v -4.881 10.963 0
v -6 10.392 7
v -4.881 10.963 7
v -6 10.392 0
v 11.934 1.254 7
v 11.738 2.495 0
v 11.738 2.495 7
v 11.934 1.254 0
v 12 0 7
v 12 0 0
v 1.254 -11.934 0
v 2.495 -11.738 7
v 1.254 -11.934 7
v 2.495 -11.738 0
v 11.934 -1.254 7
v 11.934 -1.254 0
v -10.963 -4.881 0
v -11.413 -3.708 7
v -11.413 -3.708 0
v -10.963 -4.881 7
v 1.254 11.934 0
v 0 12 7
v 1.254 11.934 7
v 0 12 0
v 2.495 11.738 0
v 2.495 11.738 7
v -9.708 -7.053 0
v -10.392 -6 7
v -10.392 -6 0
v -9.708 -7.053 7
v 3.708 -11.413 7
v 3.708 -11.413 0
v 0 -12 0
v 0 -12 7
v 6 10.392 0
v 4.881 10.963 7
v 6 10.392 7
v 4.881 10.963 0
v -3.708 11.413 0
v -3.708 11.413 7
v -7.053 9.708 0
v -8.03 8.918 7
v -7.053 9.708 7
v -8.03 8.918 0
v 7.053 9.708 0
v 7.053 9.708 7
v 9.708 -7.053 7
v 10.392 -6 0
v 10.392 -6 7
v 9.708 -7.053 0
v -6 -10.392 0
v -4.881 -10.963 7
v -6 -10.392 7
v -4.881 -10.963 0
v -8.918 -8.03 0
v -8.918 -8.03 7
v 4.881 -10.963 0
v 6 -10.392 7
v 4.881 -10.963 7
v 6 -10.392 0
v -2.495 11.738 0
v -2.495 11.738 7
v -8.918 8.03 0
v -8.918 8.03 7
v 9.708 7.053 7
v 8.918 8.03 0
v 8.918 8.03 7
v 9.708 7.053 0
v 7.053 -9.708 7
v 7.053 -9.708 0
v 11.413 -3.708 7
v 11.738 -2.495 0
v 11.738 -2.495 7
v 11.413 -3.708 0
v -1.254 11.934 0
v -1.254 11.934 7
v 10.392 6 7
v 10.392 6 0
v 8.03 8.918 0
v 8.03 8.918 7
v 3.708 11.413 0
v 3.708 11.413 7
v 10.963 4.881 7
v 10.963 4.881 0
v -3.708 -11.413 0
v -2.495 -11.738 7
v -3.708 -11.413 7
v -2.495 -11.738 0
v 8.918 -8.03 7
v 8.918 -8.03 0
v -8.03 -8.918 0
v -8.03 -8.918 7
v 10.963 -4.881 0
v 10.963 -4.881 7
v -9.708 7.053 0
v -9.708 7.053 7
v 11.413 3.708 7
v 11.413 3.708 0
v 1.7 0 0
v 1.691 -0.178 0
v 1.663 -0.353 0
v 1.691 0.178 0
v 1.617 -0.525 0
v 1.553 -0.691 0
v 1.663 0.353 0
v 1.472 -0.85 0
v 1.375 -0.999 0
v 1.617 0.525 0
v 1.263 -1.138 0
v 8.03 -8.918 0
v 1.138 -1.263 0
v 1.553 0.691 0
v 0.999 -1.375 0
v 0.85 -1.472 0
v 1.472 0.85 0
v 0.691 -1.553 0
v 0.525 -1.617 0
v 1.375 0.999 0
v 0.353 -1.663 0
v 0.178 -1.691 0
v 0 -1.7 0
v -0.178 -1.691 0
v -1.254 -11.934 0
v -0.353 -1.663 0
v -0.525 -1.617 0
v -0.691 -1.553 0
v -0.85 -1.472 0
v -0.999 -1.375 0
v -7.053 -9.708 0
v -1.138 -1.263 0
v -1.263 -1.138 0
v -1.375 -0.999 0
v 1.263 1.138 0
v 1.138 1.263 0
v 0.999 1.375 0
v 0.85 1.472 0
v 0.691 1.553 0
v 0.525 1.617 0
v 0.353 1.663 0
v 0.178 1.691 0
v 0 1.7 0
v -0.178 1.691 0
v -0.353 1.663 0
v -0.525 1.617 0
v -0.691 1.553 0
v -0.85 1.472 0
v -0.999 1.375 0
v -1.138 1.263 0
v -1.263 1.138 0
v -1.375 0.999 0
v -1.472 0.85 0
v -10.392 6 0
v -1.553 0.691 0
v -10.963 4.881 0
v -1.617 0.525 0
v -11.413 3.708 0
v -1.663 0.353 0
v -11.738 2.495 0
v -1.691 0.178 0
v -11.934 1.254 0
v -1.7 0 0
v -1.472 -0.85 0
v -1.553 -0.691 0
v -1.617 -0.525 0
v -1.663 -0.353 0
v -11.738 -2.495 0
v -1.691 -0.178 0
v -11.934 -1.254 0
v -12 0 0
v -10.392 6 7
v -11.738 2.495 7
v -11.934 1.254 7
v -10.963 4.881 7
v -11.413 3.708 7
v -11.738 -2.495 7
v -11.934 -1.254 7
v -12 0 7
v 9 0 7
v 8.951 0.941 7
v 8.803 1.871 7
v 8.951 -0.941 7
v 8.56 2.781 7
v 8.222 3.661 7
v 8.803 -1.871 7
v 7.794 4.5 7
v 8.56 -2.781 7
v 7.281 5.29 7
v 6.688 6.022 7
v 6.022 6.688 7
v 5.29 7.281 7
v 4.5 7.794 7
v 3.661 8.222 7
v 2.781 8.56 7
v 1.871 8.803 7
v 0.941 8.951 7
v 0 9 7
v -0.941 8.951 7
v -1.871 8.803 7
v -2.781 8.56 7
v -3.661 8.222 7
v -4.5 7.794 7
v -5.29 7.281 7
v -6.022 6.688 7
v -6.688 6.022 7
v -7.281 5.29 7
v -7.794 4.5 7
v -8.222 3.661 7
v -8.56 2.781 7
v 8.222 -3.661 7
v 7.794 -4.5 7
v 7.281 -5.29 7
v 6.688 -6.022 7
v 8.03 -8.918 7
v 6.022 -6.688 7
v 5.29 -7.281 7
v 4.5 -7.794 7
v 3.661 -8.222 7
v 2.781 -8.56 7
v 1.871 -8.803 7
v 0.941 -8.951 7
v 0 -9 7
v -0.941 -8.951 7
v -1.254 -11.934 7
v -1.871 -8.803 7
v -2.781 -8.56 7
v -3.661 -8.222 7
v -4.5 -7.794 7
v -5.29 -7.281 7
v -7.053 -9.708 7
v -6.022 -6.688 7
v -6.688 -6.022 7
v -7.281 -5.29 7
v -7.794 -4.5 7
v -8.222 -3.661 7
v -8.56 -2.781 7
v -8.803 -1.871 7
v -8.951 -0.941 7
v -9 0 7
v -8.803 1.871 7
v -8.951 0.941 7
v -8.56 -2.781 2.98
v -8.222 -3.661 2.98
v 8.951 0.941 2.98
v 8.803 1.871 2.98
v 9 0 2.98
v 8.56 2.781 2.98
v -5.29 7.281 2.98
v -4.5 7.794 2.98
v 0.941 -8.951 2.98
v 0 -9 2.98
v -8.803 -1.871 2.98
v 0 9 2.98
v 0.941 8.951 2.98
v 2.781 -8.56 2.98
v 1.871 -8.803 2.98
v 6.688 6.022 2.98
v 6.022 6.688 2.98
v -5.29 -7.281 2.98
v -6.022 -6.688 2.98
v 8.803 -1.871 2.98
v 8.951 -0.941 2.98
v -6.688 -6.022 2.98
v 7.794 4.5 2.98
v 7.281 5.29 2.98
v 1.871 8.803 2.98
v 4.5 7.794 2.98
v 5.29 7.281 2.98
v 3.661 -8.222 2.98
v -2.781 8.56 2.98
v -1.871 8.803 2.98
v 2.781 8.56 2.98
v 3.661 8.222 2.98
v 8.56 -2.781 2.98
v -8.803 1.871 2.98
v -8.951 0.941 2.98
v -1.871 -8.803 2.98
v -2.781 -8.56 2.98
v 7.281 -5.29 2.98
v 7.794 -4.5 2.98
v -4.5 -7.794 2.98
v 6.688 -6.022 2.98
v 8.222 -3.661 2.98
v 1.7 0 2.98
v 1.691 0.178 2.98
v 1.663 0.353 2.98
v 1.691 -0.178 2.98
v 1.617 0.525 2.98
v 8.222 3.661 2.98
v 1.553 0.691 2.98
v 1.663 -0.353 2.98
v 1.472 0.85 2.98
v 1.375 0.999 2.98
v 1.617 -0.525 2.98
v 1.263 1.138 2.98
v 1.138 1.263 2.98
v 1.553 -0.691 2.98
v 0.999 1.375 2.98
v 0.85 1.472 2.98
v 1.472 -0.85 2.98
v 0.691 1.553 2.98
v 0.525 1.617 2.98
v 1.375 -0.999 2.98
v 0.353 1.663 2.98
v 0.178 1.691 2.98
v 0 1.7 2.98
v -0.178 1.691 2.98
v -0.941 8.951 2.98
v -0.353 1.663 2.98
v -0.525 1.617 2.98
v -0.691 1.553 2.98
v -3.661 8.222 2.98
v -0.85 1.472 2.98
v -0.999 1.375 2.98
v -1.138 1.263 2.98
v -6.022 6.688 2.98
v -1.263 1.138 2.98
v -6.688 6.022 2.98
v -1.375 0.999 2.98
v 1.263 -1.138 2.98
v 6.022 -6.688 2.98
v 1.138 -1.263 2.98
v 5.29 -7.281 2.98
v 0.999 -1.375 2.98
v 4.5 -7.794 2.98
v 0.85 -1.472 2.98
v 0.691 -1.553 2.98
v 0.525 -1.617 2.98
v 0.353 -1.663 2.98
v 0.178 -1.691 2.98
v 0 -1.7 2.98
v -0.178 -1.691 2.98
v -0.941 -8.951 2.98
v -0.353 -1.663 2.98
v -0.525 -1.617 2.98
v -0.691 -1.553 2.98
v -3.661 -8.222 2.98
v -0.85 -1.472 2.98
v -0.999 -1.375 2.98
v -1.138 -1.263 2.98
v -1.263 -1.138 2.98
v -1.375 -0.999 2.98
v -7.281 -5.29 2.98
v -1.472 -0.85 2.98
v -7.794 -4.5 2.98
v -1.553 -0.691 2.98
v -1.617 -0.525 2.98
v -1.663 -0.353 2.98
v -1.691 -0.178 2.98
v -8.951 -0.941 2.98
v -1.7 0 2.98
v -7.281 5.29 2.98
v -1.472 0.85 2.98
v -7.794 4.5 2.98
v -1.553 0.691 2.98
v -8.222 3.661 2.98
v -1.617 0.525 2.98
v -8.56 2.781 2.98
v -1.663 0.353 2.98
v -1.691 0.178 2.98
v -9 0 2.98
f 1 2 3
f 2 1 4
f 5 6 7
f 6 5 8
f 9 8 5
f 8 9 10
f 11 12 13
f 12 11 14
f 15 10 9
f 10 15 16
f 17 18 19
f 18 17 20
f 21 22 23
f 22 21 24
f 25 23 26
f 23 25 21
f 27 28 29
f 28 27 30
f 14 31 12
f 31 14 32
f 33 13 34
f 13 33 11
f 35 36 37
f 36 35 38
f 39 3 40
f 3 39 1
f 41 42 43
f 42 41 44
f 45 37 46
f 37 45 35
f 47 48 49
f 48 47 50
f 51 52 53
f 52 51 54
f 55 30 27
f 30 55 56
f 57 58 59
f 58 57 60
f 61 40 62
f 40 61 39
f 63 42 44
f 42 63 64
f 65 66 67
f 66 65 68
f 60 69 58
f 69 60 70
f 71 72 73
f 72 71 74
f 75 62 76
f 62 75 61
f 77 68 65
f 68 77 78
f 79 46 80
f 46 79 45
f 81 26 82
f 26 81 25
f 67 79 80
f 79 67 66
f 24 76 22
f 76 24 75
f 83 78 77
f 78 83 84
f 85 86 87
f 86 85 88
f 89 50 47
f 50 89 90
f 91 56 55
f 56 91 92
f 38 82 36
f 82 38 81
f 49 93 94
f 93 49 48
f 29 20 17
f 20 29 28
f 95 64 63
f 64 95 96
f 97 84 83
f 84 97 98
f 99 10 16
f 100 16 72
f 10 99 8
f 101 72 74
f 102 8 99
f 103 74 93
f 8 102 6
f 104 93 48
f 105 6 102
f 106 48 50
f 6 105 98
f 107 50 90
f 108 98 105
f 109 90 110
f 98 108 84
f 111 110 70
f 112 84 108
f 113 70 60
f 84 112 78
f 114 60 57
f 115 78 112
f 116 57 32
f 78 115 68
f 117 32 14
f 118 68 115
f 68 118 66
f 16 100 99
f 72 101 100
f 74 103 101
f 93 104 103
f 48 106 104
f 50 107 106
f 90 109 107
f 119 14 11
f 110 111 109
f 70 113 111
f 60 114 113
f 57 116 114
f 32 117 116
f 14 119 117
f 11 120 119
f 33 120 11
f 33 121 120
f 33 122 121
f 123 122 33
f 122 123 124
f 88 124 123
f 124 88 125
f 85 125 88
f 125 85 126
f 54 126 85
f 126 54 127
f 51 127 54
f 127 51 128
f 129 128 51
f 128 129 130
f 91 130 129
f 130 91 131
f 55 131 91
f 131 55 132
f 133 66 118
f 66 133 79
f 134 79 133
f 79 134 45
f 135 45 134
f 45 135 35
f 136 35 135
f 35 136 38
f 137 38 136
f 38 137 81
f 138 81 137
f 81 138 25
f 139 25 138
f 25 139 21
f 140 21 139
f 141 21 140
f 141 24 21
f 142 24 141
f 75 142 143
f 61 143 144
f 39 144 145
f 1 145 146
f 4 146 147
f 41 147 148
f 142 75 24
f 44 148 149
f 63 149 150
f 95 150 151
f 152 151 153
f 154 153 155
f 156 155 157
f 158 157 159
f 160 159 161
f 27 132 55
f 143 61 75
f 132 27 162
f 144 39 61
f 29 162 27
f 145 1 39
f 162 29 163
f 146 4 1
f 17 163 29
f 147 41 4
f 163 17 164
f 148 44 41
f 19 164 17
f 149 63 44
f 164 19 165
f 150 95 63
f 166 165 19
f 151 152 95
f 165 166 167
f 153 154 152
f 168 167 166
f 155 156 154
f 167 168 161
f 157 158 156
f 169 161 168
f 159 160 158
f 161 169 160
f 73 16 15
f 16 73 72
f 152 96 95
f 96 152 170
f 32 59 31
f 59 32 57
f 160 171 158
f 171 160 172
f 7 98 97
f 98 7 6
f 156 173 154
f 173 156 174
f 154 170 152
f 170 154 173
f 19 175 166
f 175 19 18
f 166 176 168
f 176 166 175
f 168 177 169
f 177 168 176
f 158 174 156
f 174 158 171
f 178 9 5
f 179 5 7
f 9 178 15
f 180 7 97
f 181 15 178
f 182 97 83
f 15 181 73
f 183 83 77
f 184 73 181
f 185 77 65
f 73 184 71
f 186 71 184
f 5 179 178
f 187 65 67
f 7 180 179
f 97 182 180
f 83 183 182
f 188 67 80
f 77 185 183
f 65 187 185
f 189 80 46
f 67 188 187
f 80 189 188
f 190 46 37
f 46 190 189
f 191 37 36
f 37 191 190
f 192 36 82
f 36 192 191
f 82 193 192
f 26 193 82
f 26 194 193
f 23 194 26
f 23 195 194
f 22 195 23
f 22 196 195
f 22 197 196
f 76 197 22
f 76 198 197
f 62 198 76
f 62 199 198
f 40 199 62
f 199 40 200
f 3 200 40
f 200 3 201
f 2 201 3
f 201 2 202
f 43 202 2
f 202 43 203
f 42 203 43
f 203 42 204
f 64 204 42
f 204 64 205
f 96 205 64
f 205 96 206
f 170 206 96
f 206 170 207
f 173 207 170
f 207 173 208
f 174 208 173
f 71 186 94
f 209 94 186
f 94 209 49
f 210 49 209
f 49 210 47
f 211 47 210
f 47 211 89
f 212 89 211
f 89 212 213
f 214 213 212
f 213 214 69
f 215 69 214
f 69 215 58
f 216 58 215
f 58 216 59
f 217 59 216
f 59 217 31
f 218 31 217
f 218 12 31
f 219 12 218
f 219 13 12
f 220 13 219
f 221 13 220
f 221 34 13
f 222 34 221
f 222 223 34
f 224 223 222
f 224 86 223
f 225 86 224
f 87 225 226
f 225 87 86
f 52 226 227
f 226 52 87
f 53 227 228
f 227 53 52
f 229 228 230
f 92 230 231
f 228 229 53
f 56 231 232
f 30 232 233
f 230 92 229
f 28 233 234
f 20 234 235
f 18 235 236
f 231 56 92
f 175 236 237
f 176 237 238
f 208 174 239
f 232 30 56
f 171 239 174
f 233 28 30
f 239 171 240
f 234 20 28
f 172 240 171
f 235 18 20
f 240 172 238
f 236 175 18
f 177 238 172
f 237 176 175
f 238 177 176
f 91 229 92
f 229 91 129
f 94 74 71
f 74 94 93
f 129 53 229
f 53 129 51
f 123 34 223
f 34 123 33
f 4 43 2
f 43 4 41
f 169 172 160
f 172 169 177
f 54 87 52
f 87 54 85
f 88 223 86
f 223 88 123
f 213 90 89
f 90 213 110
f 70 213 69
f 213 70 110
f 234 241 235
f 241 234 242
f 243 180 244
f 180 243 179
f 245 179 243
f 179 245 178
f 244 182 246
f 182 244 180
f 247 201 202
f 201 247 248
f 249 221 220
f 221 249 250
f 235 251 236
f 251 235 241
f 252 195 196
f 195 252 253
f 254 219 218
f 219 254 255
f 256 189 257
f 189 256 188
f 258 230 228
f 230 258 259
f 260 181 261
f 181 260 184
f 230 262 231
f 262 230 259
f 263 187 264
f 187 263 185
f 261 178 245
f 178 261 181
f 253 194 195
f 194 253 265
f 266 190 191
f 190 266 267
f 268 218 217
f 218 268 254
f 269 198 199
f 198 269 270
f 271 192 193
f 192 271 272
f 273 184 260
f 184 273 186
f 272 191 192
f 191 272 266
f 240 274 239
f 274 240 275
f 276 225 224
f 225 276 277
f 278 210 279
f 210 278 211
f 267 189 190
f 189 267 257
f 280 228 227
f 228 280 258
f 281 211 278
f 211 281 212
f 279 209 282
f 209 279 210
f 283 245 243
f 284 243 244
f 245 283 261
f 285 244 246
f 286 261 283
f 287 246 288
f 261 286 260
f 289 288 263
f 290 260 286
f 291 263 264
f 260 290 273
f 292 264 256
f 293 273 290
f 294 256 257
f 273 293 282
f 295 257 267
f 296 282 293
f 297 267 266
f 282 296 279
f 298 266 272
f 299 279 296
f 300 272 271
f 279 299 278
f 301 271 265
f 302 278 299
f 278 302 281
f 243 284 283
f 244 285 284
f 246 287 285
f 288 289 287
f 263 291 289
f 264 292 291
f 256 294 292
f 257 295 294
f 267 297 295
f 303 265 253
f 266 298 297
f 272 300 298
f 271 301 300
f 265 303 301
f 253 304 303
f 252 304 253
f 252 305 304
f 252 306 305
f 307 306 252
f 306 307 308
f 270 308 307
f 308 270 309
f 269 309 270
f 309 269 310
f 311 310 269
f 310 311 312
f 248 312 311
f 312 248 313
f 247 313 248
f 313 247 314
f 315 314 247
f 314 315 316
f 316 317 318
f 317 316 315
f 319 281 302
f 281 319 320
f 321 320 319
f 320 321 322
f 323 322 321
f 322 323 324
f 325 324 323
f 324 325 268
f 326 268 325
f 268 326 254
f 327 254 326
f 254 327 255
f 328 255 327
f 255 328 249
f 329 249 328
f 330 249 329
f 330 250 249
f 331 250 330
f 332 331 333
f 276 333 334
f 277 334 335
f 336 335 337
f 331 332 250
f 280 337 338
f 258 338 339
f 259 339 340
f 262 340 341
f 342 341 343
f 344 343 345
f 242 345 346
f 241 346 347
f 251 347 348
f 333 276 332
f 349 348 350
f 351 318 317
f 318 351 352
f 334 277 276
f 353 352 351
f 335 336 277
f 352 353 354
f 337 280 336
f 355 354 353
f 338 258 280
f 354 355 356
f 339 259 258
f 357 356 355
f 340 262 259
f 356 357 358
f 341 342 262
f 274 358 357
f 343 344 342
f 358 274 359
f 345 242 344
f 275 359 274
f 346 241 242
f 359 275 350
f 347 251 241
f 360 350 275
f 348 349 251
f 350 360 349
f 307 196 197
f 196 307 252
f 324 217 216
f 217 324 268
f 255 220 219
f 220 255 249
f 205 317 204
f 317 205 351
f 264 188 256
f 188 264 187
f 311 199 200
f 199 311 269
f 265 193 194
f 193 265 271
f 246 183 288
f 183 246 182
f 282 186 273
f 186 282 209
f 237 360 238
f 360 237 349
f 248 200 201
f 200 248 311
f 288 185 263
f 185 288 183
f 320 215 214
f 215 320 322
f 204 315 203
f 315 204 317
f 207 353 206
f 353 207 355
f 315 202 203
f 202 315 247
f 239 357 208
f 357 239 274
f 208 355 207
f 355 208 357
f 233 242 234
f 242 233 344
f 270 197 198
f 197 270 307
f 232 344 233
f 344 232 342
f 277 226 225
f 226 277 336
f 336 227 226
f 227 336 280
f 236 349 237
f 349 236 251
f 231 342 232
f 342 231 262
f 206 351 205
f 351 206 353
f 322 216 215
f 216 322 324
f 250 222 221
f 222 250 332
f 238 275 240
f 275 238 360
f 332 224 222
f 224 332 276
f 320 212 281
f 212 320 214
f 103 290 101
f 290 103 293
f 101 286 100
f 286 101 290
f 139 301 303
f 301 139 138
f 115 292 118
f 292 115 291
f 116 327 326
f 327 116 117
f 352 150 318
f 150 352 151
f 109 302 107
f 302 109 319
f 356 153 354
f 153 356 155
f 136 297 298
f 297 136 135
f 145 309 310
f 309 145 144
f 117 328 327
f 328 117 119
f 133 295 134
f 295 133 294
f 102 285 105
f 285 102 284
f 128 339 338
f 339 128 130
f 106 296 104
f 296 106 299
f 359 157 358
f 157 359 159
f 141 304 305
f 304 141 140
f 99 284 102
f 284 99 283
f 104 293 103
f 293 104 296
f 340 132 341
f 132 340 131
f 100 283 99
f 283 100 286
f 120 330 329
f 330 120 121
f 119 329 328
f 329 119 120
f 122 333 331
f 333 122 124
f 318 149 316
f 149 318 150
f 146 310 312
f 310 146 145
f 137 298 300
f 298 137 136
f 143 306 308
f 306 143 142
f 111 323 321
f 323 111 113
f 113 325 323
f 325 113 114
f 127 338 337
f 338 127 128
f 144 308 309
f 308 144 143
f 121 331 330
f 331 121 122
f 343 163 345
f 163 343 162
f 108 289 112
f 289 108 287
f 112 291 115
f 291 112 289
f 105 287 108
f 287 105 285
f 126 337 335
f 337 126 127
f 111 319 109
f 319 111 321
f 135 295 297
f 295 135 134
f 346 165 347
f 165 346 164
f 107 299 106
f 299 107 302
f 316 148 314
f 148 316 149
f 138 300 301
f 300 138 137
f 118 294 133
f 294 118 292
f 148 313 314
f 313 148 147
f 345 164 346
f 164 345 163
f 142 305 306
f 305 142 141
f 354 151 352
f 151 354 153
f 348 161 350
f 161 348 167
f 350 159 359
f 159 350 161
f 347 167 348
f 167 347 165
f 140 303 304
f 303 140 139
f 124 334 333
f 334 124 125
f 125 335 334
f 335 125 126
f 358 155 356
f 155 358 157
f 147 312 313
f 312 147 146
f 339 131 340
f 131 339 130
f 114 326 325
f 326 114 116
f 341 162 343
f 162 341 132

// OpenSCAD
// Recessed magnet cup.
$fn = 60;
eps = 0.02;
magnet_d = 18;
wall = 3;
outer_d = magnet_d+2*wall;
height = wall+4;
difference() {
    cylinder(d=outer_d,h=height);
    translate([0,0,wall-eps]) cylinder(d=magnet_d,h=height-wall+2*eps);
    translate([0,0,-eps]) cylinder(d=3.4,h=wall+2*eps);
}
